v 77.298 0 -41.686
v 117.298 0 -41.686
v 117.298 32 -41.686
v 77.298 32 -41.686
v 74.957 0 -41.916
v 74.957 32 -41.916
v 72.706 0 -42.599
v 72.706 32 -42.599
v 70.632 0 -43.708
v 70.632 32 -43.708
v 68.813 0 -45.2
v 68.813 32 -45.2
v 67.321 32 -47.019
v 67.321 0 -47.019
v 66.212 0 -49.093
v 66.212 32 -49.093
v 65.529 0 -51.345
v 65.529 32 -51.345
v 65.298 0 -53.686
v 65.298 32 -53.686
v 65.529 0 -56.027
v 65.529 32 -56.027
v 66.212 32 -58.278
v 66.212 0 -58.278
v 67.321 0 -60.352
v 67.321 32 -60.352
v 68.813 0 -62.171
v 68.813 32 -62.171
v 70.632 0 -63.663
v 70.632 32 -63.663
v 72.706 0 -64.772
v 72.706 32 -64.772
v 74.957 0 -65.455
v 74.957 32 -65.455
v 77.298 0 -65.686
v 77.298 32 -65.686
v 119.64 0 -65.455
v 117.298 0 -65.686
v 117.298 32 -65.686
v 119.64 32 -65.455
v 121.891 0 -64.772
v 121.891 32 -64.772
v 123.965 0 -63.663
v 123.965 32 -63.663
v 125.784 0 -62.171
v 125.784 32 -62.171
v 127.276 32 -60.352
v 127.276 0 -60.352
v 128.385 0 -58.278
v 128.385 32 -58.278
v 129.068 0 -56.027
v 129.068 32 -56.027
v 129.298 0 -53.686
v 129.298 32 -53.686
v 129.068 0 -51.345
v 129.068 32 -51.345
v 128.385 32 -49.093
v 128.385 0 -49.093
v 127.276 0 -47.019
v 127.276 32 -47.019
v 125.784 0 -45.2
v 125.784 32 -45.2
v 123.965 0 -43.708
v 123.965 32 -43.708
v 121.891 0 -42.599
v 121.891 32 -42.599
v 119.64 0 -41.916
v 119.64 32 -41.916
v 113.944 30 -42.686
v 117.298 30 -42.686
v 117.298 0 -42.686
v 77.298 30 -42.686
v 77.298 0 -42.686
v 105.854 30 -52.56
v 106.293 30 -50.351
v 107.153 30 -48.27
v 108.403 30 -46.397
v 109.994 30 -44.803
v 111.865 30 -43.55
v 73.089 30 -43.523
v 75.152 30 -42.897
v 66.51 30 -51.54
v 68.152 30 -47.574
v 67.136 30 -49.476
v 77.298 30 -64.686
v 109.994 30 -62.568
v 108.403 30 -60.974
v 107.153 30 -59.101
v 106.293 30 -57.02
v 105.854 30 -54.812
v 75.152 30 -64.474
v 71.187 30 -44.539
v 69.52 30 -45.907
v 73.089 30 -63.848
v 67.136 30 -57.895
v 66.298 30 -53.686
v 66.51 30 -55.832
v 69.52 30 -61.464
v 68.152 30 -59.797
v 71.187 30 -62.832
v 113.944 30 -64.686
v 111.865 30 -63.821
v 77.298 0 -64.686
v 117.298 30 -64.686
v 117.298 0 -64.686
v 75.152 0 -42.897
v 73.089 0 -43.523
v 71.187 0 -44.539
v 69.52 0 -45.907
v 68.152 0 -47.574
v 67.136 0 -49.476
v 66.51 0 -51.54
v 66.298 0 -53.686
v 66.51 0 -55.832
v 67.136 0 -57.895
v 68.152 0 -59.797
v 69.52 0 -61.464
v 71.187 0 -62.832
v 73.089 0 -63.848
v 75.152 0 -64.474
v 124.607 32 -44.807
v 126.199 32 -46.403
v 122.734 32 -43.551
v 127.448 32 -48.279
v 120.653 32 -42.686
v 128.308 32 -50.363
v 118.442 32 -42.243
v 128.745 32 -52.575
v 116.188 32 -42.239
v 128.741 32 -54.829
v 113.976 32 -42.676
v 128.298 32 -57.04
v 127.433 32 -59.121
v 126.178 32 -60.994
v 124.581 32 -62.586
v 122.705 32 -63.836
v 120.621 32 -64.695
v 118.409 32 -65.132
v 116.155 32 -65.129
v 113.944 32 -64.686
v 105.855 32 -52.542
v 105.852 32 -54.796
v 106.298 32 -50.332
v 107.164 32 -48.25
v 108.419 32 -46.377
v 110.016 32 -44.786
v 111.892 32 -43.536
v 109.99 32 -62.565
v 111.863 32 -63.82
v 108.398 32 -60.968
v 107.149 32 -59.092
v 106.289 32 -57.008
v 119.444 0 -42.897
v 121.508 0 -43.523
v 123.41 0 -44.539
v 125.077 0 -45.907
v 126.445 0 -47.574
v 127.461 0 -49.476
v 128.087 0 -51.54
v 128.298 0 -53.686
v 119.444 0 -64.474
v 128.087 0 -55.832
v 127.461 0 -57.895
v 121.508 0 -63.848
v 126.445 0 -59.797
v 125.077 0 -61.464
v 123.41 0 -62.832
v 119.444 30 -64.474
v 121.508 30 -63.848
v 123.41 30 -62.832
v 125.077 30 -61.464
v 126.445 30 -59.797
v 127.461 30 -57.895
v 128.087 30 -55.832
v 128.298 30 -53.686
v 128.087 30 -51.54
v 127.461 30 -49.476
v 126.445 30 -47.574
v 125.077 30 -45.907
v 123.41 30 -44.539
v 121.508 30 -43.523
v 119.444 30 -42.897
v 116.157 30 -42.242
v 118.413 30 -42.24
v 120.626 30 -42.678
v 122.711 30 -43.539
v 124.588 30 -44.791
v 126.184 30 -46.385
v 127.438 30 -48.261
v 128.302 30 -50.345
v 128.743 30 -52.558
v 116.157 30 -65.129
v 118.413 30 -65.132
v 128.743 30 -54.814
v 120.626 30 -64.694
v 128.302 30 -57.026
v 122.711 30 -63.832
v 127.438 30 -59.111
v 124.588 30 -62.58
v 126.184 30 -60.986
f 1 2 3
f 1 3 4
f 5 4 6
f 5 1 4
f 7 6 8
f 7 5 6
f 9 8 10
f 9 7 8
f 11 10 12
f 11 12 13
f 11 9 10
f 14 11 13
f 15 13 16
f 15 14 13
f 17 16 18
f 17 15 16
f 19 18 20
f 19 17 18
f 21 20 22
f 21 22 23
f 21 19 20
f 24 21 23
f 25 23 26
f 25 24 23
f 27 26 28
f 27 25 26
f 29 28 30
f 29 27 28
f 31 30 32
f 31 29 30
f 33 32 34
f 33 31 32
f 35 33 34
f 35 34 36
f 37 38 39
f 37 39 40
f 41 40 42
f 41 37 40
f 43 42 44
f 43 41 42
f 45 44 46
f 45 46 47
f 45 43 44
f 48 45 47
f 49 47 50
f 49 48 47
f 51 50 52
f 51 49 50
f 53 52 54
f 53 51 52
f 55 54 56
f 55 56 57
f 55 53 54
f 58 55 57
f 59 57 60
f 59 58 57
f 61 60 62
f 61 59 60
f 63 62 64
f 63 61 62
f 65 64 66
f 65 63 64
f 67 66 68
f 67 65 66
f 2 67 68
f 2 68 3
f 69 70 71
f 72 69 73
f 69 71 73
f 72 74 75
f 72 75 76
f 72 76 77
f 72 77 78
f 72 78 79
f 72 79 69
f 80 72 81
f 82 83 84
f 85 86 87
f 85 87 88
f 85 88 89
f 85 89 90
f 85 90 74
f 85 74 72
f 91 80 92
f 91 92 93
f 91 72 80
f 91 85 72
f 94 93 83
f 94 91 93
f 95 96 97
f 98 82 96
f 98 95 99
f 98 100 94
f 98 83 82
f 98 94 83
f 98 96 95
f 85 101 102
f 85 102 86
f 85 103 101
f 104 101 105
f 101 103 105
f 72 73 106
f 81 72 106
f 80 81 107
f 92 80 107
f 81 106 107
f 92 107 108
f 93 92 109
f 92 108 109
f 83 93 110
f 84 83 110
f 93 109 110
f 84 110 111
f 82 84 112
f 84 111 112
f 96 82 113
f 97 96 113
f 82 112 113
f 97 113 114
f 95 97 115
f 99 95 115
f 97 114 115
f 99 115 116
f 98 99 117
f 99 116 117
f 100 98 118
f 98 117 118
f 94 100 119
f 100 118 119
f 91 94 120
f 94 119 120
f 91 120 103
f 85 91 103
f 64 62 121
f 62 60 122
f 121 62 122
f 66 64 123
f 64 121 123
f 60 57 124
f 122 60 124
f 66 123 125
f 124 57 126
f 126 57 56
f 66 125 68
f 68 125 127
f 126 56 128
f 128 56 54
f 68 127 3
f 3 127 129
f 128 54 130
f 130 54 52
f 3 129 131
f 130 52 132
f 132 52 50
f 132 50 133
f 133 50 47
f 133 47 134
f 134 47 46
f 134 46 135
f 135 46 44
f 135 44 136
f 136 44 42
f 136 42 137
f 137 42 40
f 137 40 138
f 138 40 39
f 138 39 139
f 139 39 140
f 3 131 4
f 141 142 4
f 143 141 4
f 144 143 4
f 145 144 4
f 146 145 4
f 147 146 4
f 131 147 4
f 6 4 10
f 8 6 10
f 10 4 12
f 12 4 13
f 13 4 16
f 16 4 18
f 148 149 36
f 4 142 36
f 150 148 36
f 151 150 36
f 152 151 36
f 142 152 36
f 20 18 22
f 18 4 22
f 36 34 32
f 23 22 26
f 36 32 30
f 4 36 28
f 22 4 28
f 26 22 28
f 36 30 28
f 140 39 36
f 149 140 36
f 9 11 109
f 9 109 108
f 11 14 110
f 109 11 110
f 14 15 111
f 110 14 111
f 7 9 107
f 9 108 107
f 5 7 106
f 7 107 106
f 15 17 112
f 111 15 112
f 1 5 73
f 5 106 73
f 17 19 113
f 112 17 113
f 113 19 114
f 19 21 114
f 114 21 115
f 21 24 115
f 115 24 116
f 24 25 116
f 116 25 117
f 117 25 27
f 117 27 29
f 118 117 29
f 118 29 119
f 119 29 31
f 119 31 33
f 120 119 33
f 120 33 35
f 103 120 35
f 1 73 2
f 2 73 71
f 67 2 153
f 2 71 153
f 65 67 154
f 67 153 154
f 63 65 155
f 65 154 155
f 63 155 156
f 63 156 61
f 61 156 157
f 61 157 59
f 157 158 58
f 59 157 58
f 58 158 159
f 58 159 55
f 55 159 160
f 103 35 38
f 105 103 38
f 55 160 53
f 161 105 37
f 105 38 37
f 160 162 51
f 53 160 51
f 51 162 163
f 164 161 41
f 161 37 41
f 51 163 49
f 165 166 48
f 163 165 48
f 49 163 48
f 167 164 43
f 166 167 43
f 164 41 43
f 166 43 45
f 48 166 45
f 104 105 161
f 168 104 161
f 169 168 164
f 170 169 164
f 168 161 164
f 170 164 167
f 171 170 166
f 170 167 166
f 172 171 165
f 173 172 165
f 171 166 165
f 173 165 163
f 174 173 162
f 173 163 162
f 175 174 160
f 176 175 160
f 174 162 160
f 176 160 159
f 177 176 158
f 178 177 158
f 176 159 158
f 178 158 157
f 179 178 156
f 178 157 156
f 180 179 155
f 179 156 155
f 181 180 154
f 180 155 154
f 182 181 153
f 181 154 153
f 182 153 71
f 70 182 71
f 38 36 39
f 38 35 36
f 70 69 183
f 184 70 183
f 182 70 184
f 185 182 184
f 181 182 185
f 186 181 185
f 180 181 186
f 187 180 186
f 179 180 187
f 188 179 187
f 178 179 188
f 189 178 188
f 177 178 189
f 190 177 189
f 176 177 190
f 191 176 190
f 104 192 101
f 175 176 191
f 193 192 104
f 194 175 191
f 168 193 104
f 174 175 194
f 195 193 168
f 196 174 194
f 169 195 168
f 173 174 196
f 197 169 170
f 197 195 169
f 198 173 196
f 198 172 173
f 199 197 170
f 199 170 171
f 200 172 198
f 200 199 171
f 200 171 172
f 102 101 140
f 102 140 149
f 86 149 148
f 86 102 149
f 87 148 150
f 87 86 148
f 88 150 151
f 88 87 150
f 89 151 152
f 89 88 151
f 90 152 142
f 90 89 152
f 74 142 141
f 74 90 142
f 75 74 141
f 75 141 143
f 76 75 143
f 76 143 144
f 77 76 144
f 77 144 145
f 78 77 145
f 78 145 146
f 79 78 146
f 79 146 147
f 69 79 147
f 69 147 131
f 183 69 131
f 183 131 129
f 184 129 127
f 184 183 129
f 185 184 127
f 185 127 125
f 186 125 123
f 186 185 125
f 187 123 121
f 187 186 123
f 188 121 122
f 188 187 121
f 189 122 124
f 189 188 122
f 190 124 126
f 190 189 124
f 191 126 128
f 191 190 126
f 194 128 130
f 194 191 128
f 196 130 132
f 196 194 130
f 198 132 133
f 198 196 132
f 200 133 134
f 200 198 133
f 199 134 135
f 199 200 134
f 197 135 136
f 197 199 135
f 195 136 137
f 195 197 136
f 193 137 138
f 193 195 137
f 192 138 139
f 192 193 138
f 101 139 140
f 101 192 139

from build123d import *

# Parameters (mm, degrees)
BOSS_EXTRUDE1_DEPTH = 30
SKETCH3_R           = 11.5
BOSS_EXTRUDE2_DEPTH = 2


with BuildPart() as part:
    # Sketch2 → Boss-Extrude1 (new body)
    with BuildSketch(Plane(origin=(0, 0, 0), x_dir=(1, 0, 0), z_dir=(0, 1, 0))):
        with BuildLine():
            Line((77.29844251, 41.68564095), (117.29844251, 41.68564095))
            ThreePointArc((117.29844251, 41.68564095), (129.29844251, 53.68564095), (117.29844251, 65.68564095))
            Line((117.29844251, 65.68564095), (77.29844251, 65.68564095))
            ThreePointArc((77.29844251, 65.68564095), (65.29844251, 53.68564095), (77.29844251, 41.68564095))
        make_face()
        with BuildLine():
            Line((77.29844251, 64.68564095), (117.29844251, 64.68564095))
            ThreePointArc((117.29844251, 64.68564095), (128.29844251, 53.68564095), (117.29844251, 42.68564095))
            Line((117.29844251, 42.68564095), (77.29844251, 42.68564095))
            ThreePointArc((77.29844251, 42.68564095), (66.29844251, 53.68564095), (77.29844251, 64.68564095))
        make_face(mode=Mode.SUBTRACT)
    extrude(amount=BOSS_EXTRUDE1_DEPTH)

    # Sketch3 → Boss-Extrude2 (add)
    with BuildSketch(Plane(origin=(0, 30, 0), x_dir=(1, 0, 0), z_dir=(0, 1, 0))):
        with BuildLine():
            Line((77.29844251, 65.68564095), (117.29844251, 65.68564095))
            ThreePointArc((117.29844251, 65.68564095), (129.29844251, 53.68564095), (117.29844251, 41.68564095))
            Line((117.29844251, 41.68564095), (77.29844251, 41.68564095))
            ThreePointArc((77.29844251, 41.68564095), (65.29844251, 53.68564095), (77.29844251, 65.68564095))
        make_face()
        with Locations(Location((117.29844251, 53.68564095, 0), (0, 0, 106.957426294))):
            Circle(SKETCH3_R, mode=Mode.SUBTRACT)
    extrude(amount=BOSS_EXTRUDE2_DEPTH)


solid = part.part
